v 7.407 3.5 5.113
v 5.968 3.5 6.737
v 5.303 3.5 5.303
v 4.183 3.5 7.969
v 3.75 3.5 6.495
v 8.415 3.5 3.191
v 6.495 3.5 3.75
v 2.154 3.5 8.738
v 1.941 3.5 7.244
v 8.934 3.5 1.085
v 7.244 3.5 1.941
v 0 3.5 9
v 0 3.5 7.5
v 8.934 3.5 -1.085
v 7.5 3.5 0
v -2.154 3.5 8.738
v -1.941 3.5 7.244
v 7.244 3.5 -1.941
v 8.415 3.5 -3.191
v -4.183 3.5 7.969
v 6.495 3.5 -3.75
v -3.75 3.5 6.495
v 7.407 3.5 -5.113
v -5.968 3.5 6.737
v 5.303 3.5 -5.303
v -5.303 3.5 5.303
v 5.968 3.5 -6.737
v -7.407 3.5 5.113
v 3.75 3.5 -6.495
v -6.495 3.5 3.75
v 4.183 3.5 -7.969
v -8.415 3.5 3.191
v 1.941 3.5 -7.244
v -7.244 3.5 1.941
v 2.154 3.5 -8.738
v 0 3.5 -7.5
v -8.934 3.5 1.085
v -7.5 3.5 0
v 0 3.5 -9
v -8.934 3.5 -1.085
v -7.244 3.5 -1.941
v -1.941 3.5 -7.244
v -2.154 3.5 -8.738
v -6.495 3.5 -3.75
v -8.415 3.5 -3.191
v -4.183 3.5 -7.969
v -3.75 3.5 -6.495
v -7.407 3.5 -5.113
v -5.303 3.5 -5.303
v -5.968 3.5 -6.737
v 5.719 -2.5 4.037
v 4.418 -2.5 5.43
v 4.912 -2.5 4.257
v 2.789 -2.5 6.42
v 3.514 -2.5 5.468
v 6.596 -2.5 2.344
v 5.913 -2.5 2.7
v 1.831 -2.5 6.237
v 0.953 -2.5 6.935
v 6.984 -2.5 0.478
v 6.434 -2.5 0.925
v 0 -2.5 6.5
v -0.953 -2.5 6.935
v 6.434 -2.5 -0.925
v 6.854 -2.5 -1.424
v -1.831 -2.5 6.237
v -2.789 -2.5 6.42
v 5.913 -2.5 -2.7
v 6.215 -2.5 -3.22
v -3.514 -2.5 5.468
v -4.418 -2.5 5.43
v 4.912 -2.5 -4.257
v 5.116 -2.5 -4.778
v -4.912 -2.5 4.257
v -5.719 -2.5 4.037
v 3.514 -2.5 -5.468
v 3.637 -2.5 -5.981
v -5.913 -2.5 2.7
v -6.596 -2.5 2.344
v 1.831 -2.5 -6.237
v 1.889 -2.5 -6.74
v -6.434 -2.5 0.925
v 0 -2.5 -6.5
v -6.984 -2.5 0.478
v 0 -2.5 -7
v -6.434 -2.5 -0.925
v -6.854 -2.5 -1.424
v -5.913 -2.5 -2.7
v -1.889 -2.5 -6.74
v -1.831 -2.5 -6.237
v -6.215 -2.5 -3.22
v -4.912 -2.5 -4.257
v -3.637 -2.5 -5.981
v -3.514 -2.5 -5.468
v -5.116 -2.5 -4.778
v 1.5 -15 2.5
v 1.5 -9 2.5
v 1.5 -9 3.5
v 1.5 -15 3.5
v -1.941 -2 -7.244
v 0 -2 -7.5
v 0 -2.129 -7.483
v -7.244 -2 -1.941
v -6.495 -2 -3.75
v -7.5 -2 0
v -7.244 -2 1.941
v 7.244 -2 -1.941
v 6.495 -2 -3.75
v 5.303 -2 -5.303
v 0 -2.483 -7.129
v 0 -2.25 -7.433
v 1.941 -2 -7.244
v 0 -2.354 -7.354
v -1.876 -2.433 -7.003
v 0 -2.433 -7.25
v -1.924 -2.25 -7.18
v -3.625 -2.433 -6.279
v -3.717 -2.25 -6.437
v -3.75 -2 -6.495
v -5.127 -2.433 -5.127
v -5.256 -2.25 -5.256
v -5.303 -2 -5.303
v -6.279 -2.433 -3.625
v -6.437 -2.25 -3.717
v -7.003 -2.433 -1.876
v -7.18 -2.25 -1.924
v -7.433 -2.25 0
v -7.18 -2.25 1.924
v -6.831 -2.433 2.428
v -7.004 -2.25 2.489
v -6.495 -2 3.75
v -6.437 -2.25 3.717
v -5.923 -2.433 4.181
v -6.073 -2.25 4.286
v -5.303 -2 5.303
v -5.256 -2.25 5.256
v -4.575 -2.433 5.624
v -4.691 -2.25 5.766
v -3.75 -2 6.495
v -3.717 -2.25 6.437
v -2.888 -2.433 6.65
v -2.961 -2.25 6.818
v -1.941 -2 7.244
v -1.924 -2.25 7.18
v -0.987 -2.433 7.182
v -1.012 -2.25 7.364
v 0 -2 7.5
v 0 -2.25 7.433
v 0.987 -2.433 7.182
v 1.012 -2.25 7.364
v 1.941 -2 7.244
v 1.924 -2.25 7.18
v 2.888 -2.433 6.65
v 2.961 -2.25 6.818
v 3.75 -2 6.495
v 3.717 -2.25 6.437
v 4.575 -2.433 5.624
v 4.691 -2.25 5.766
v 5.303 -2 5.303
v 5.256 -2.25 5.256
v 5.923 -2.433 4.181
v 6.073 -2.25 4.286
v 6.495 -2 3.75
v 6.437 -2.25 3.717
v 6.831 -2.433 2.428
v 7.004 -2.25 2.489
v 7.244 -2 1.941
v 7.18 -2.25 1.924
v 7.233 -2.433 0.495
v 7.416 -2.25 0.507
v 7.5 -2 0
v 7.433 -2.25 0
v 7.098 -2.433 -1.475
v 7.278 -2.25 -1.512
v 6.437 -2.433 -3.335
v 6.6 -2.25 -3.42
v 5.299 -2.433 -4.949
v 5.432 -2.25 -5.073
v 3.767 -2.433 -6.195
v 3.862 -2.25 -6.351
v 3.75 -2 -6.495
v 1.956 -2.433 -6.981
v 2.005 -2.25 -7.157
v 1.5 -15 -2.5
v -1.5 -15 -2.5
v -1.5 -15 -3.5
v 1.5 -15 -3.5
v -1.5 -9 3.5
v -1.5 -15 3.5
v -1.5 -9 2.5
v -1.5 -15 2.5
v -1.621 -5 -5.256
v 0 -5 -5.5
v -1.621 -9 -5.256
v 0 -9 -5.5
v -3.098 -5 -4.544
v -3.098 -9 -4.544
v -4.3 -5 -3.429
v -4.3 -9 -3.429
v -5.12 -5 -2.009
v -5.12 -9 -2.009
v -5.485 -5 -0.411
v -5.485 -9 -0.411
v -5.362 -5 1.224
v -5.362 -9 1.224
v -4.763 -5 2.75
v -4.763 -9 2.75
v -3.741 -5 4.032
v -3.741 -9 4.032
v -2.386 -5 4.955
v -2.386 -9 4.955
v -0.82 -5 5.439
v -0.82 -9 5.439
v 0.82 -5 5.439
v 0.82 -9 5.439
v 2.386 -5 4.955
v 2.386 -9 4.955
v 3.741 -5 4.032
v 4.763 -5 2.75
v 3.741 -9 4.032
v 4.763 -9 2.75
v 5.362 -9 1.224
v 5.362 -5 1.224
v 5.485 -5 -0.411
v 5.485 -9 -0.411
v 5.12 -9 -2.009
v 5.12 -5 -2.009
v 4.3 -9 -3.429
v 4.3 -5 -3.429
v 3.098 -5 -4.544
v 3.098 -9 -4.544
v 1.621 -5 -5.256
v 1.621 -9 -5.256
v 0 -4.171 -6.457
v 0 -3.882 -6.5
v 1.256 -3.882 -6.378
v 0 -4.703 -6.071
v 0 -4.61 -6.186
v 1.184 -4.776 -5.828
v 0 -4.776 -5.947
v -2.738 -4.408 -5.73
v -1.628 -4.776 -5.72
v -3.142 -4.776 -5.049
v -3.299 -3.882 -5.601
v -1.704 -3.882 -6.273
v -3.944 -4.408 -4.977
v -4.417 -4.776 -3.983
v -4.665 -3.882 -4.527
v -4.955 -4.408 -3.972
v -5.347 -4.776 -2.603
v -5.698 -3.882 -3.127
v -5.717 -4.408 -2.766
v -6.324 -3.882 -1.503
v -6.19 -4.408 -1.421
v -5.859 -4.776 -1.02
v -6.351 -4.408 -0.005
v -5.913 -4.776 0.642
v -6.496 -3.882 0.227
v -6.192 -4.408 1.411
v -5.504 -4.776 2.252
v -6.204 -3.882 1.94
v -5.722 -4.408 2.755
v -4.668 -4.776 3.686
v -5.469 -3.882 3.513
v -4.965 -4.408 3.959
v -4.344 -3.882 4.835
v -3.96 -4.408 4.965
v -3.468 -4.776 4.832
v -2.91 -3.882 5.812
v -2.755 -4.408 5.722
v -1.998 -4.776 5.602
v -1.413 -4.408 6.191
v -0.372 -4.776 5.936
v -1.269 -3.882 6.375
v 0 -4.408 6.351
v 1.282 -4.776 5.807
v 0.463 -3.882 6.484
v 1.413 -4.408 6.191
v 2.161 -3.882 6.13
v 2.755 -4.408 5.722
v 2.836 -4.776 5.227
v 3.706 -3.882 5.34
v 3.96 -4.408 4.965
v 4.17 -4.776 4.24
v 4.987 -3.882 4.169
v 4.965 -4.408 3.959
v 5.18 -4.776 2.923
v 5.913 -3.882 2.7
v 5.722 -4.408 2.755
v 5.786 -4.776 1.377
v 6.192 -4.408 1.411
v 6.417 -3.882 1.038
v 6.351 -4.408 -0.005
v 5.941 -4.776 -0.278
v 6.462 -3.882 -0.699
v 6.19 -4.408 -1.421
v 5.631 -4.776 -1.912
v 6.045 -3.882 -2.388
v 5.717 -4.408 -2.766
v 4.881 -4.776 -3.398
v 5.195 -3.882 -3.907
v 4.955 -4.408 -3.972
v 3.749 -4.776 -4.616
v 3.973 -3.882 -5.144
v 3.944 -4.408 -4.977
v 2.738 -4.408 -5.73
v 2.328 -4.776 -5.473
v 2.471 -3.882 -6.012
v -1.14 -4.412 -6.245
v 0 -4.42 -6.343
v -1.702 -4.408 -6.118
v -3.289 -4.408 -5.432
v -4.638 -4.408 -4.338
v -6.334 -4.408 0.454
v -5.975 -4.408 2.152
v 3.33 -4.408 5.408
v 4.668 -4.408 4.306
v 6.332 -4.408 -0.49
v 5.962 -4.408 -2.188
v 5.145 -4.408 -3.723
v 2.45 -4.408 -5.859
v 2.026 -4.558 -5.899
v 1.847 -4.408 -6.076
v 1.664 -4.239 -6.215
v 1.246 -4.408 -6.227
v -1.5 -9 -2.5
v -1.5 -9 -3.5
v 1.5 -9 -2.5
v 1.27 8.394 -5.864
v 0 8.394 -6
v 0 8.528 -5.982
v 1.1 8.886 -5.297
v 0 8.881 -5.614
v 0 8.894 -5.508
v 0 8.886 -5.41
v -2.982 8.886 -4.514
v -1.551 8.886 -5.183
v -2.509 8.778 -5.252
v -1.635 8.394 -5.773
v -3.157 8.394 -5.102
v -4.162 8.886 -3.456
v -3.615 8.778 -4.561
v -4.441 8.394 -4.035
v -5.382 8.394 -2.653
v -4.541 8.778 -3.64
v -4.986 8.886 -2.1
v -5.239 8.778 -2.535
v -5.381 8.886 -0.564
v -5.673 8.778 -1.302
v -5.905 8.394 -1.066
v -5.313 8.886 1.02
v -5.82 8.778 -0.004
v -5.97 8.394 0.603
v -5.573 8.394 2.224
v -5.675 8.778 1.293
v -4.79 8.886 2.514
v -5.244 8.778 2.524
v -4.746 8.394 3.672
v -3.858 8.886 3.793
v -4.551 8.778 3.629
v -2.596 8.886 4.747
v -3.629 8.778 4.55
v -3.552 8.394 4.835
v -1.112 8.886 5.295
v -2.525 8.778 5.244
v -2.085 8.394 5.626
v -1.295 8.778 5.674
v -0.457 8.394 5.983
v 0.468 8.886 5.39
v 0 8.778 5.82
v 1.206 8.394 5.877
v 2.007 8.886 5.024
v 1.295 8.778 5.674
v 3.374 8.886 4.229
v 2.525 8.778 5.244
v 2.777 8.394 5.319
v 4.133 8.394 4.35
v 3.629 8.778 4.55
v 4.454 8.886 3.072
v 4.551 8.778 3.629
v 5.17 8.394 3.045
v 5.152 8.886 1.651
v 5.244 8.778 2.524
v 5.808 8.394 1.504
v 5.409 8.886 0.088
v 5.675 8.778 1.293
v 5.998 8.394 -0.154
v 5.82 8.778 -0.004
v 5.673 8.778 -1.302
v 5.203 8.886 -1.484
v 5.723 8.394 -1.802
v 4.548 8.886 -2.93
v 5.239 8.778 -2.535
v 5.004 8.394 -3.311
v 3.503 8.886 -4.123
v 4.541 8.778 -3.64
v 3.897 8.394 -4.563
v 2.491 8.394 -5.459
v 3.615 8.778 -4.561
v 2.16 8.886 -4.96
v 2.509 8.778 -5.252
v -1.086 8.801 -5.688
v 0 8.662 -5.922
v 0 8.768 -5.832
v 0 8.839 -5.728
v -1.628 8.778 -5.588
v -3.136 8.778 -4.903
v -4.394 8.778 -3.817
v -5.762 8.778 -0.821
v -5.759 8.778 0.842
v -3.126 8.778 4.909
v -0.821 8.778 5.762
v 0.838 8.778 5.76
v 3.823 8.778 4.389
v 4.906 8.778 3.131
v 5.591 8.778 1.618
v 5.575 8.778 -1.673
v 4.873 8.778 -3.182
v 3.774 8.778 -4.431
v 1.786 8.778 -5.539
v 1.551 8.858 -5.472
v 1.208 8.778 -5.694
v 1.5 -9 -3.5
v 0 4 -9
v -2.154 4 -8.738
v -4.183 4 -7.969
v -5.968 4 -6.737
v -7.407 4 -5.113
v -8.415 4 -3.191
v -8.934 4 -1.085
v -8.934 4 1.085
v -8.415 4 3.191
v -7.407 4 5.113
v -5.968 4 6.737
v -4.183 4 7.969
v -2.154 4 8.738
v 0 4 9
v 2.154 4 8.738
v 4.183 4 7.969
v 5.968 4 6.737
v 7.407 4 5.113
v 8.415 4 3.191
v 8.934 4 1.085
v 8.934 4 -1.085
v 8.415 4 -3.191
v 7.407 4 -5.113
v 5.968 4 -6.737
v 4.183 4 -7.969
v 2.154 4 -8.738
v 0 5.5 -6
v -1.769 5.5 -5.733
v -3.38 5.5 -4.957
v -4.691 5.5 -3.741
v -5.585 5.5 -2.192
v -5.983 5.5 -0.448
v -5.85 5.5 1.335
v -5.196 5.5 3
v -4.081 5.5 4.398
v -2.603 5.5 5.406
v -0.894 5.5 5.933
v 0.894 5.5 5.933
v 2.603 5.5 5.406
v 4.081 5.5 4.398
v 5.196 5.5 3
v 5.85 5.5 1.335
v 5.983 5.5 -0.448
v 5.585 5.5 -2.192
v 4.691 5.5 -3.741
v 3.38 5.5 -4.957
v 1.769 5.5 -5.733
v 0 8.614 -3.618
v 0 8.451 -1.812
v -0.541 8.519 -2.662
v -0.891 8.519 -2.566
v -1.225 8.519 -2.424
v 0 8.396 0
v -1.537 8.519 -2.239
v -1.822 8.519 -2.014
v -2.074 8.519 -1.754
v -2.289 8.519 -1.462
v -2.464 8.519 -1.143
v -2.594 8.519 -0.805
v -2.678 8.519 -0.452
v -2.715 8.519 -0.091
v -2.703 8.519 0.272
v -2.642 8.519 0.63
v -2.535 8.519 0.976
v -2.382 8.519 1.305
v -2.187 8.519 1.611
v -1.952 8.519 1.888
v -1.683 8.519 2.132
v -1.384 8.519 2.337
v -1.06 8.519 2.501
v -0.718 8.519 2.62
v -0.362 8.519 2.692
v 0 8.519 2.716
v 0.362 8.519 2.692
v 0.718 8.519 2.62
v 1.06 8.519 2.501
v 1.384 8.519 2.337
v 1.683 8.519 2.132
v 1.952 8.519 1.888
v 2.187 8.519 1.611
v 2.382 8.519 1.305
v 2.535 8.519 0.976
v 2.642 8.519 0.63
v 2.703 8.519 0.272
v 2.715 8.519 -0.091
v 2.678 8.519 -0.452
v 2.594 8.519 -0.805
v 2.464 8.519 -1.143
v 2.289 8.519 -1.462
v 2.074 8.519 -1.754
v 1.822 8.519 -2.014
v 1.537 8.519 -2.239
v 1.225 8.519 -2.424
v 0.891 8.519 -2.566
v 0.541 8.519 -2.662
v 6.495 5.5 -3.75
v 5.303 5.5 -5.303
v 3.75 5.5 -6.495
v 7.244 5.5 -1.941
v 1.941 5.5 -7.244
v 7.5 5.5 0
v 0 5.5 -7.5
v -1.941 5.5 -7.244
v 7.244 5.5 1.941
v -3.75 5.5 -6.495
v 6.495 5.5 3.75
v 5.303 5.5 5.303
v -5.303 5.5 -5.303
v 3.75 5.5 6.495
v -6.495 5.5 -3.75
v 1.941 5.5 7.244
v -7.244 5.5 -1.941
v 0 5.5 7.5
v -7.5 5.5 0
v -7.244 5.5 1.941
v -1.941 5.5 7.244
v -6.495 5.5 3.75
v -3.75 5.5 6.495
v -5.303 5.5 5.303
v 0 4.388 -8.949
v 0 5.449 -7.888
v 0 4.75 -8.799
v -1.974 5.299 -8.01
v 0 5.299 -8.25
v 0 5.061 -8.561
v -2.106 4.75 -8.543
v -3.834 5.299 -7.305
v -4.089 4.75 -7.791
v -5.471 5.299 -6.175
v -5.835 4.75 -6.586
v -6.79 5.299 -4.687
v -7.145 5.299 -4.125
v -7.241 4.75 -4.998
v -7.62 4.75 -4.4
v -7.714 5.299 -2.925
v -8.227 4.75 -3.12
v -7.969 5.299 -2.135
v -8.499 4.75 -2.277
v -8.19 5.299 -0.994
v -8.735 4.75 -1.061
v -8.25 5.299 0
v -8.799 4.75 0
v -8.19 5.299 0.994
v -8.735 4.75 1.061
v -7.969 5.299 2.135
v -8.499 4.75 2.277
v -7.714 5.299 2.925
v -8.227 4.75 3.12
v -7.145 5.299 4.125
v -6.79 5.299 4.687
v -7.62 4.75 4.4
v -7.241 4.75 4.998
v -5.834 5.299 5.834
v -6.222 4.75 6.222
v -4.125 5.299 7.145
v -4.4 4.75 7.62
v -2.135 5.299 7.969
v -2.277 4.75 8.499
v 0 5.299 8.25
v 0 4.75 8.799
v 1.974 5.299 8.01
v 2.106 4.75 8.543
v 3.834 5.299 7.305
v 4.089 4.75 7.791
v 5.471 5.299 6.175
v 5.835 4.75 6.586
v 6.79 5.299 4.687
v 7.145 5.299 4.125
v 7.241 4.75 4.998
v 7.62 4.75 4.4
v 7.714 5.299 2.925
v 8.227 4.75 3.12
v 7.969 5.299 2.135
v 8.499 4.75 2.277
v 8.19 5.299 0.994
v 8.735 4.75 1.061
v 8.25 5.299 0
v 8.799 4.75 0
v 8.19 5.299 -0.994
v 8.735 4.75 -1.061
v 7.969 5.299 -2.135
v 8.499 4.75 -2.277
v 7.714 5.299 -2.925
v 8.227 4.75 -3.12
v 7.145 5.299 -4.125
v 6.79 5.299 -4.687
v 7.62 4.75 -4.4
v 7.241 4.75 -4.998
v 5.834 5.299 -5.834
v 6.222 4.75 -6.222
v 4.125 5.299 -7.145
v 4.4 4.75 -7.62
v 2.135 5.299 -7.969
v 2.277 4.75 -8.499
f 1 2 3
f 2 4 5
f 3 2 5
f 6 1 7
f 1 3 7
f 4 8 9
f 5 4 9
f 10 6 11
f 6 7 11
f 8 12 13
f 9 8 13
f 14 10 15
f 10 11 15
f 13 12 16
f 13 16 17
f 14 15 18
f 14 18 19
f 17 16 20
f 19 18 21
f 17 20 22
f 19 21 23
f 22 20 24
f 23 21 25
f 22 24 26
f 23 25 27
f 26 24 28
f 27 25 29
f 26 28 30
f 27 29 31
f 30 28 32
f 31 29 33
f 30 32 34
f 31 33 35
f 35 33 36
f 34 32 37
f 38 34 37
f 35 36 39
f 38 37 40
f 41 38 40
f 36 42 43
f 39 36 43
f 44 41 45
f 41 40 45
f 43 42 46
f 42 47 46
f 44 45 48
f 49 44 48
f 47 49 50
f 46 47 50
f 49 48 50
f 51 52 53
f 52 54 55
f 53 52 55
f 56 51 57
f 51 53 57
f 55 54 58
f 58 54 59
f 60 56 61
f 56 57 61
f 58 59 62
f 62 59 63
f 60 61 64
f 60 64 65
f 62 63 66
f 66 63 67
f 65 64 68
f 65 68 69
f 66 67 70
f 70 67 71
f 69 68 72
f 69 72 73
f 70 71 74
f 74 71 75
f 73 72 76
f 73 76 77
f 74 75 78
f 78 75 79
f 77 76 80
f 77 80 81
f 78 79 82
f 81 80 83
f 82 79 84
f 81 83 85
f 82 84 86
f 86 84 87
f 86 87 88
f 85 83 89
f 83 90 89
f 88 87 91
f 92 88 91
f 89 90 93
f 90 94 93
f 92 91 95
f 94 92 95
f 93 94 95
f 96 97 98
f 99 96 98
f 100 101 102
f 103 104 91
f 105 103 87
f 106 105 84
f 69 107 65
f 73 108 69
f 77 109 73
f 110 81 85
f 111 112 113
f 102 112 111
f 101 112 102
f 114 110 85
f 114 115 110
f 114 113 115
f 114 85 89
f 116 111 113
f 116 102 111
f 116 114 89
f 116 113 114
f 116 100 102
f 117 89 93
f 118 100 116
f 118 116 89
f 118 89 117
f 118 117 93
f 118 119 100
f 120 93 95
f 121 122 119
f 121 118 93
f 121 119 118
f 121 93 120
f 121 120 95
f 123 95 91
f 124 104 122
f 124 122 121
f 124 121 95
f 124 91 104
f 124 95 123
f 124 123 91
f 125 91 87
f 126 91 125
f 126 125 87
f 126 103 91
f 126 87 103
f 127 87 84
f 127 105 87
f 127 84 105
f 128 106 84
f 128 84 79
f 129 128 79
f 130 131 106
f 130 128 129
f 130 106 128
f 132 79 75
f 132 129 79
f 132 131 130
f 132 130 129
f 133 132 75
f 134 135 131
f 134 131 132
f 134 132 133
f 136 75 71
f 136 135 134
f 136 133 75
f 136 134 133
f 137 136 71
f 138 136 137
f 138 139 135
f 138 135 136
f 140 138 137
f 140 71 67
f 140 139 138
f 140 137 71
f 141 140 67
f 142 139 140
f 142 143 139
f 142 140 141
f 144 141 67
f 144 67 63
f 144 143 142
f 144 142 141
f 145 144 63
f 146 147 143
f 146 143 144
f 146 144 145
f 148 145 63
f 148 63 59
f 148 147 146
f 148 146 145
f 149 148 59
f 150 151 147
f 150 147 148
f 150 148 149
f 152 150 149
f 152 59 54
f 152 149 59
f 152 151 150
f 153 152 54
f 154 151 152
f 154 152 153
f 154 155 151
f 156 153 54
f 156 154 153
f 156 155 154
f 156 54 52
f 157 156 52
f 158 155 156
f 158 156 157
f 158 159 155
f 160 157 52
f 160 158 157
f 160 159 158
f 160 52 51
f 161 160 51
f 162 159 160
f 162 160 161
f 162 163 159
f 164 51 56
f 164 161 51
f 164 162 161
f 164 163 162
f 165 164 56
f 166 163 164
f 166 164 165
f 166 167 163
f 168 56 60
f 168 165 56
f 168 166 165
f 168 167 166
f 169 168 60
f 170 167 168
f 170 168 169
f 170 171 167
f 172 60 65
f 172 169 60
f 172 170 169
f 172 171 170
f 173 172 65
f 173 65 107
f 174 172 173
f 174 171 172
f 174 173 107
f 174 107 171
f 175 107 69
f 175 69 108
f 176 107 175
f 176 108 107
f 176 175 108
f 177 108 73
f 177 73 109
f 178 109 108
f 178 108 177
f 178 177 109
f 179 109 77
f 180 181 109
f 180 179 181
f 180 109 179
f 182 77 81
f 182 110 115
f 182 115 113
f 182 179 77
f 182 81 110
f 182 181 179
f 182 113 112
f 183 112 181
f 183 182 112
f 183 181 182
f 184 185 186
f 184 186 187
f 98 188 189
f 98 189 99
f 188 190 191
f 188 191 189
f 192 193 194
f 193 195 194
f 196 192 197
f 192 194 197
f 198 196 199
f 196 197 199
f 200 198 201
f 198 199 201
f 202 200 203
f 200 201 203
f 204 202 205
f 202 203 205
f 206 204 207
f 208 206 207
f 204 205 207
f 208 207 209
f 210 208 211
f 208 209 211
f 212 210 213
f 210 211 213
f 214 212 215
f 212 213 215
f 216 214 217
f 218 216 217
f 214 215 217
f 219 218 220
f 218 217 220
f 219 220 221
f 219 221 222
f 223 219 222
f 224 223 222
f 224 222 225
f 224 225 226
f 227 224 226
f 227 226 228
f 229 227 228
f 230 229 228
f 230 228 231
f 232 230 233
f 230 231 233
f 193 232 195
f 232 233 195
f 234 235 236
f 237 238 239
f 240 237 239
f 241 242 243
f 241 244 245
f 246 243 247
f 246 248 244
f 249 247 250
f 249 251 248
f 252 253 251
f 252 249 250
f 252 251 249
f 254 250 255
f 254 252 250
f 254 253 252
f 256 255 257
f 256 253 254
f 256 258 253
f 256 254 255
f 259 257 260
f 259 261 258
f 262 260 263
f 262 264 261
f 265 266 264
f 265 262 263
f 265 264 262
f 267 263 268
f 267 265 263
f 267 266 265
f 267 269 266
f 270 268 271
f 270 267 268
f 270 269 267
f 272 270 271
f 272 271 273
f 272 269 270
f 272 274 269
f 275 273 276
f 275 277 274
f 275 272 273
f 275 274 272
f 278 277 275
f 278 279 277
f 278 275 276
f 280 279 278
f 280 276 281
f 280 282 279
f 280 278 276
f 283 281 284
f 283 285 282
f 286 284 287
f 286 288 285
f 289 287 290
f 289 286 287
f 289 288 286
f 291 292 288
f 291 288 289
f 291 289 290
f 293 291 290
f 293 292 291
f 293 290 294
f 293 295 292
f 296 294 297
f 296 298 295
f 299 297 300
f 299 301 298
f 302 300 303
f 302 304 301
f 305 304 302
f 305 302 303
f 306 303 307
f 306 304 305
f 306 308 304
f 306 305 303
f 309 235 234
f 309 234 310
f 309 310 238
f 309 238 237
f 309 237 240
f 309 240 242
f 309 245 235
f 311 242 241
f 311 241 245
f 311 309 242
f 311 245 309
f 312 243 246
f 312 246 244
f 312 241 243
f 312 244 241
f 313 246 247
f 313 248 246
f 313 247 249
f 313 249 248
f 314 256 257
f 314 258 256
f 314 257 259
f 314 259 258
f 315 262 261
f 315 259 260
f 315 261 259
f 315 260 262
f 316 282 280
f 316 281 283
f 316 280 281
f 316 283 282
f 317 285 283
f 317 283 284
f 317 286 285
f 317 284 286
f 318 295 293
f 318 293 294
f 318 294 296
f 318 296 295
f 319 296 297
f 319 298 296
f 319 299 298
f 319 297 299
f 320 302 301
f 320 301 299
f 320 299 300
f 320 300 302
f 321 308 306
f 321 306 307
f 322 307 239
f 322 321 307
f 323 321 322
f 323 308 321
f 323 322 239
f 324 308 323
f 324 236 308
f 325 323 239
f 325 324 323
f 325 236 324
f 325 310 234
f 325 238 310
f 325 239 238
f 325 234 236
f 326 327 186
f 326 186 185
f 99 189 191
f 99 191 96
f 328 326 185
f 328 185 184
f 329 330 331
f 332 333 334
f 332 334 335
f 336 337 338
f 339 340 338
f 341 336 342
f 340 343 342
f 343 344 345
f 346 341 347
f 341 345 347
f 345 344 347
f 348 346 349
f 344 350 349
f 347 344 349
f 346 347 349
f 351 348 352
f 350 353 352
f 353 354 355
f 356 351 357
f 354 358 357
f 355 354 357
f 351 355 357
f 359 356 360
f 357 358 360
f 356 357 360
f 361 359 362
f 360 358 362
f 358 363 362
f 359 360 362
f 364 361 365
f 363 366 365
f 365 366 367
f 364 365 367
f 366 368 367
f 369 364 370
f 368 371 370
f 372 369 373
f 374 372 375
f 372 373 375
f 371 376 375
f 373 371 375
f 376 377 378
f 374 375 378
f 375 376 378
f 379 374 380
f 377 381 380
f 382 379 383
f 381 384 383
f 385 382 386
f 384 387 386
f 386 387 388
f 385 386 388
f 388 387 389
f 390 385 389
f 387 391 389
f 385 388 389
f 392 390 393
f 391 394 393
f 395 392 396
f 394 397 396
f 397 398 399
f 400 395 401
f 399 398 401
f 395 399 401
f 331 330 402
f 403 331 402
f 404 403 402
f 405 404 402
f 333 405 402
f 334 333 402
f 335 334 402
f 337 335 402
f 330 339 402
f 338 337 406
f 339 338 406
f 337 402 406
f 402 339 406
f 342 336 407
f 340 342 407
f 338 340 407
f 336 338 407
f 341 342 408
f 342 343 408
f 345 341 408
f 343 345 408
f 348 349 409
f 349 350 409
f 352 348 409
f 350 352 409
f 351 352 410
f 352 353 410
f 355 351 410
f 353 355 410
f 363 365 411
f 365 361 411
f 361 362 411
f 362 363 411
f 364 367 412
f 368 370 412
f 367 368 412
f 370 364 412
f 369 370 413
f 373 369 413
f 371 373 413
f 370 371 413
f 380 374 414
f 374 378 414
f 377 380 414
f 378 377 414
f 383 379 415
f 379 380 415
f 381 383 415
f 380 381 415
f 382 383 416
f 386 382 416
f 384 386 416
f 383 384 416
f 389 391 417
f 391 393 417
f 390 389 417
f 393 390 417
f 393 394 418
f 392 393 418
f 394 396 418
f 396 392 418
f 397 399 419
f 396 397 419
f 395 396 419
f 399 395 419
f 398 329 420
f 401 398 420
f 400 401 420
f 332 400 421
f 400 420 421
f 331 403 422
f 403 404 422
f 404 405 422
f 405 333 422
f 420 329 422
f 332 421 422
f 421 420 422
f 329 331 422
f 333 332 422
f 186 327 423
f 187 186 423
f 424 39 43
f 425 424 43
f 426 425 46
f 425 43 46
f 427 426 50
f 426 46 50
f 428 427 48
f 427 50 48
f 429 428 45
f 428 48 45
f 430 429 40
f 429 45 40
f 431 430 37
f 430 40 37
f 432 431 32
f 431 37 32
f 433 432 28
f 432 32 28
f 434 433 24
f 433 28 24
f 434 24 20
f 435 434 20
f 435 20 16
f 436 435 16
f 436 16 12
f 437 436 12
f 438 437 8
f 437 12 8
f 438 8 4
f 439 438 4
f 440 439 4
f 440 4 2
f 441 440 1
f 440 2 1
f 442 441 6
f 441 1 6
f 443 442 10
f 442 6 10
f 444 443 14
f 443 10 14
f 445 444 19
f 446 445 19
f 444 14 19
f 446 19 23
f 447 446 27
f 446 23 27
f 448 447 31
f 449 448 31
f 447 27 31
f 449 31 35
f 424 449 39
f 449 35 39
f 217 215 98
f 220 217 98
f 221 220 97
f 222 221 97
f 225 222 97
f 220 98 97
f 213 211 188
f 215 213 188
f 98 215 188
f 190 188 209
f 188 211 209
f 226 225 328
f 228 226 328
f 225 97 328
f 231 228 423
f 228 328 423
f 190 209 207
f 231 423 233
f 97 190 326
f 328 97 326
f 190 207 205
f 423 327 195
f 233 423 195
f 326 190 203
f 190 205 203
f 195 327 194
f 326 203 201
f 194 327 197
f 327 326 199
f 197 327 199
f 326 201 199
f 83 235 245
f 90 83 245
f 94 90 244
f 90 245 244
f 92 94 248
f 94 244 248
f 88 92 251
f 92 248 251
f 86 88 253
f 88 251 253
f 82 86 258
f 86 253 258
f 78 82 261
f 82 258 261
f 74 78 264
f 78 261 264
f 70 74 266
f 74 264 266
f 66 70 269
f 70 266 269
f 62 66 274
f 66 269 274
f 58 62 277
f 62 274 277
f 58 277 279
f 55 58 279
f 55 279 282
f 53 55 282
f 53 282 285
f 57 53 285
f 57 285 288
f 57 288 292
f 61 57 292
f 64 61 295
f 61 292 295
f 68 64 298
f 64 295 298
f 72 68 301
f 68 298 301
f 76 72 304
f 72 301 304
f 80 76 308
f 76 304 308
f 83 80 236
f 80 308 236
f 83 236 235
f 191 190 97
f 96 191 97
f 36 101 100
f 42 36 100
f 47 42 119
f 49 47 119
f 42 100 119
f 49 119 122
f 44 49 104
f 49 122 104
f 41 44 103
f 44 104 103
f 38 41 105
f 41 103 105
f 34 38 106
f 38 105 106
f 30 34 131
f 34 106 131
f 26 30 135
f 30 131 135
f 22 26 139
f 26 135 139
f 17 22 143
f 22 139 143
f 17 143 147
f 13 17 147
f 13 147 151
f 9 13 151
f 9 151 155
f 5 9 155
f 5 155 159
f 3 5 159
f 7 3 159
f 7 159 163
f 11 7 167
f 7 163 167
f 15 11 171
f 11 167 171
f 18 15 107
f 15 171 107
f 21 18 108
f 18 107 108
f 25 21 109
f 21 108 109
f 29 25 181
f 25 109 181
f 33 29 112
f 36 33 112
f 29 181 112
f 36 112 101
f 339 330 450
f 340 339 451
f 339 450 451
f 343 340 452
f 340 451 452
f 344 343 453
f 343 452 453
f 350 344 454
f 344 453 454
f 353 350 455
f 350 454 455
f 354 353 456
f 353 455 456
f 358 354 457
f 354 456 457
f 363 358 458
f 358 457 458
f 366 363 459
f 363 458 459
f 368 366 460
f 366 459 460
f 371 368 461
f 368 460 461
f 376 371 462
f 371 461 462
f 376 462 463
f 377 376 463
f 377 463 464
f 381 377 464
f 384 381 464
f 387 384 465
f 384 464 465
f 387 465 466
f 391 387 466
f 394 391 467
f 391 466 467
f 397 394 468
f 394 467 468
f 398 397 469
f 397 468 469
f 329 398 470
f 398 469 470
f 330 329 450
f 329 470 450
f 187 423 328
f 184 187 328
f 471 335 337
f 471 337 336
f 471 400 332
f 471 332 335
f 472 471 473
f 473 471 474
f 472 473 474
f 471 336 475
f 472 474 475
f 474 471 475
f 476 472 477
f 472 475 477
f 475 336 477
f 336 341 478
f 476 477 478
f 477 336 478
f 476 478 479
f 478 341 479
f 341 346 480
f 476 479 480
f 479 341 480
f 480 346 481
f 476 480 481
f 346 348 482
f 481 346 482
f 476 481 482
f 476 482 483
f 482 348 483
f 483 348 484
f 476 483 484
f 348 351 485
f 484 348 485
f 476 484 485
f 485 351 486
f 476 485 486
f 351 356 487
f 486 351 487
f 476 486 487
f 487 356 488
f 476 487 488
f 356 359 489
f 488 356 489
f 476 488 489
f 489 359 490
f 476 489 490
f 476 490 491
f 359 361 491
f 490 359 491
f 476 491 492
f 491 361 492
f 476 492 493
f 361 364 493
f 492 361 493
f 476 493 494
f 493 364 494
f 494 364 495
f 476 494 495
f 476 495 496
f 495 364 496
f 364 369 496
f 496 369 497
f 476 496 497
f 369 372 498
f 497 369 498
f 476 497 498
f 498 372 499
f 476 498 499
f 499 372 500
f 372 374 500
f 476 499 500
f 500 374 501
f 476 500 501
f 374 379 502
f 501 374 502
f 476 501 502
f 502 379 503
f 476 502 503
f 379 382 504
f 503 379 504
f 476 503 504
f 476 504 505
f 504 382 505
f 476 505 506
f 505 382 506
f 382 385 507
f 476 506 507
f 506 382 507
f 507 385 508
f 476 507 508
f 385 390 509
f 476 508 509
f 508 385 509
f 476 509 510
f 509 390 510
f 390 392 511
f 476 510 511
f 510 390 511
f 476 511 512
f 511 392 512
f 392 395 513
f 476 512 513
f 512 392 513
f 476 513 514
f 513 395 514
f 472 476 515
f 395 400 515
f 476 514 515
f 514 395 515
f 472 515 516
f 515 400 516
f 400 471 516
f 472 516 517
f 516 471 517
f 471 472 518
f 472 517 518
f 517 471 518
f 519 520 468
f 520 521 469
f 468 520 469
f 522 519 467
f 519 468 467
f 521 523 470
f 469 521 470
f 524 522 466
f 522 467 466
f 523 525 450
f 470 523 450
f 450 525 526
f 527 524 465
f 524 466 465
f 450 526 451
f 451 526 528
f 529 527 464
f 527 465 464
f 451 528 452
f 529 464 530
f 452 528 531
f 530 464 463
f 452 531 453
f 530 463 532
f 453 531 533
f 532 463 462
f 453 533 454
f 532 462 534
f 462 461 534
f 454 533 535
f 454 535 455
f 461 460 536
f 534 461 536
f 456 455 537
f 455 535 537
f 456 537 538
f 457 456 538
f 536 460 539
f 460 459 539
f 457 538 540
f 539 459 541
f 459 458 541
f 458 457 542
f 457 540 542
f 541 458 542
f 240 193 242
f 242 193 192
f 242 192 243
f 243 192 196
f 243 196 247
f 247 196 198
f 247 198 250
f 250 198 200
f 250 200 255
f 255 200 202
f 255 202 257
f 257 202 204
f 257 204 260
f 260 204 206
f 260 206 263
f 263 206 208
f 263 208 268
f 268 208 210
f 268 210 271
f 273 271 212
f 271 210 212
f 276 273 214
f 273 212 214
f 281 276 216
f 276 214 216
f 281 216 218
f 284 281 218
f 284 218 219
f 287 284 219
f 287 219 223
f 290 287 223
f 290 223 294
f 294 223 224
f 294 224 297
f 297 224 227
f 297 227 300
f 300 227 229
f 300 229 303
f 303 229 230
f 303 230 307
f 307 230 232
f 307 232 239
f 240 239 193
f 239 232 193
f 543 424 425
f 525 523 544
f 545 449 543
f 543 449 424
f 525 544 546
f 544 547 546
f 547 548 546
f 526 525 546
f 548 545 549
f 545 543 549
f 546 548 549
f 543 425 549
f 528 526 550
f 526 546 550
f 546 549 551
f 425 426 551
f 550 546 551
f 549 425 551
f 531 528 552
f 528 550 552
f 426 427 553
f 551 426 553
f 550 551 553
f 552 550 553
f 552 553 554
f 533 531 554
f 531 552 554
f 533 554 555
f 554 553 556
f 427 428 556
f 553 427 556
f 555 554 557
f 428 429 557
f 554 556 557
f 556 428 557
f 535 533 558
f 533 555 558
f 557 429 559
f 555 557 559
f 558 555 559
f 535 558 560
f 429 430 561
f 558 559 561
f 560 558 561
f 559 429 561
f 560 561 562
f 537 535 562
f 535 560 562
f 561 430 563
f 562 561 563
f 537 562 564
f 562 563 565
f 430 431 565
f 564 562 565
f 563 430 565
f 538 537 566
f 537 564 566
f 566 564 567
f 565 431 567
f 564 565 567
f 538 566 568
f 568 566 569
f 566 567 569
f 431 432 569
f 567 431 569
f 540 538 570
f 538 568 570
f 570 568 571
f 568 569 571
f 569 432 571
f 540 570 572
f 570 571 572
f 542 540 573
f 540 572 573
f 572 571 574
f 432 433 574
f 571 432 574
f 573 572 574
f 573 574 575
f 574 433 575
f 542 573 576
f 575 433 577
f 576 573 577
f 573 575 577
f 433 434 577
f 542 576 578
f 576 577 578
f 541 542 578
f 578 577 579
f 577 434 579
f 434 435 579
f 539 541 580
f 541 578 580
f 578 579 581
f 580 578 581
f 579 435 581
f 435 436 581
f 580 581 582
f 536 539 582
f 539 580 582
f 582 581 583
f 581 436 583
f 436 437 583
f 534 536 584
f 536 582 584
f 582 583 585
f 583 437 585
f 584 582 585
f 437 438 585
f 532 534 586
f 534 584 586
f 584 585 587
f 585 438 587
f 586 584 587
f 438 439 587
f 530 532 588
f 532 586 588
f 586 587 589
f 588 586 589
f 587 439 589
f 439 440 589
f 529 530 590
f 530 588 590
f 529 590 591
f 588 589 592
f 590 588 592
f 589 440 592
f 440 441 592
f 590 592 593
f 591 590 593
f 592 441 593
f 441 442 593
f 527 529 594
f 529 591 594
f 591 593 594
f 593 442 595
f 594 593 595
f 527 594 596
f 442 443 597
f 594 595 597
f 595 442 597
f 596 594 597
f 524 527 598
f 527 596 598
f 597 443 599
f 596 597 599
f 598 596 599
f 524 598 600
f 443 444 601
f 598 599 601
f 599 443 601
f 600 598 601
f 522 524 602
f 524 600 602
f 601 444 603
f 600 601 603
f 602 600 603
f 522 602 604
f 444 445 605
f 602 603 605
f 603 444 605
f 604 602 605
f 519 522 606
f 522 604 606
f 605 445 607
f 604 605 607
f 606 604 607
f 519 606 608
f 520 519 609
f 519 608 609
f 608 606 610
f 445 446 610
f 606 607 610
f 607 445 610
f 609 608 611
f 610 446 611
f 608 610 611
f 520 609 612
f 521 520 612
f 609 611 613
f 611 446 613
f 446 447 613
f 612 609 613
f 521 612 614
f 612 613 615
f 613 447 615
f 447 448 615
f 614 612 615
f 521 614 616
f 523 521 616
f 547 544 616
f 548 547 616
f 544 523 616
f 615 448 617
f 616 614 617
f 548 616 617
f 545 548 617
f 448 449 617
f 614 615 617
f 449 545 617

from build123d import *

# Parameters (mm, degrees)
FILLET1_R           = 1.5
FILLET2_R           = 0.5
FILLET3_R           = 1
FILLET4_R           = 0.5
SKETCH2_W           = 3
SKETCH2_H           = 1
BOSS_EXTRUDE1_DEPTH = 6


with BuildPart() as part:
    # Sketch1 → Revolve1 (revolve)
    with BuildSketch(Plane.XY, mode=Mode.PRIVATE) as revolve1_sk:
        with BuildLine():
            Line((6, 9), (6, 5.5))
            Line((6, 5.5), (9, 5.5))
            Line((9, 5.5), (9, 3.5))
            Line((9, 3.5), (7.5, 3.5))
            Line((7.5, 3.5), (7.5, -2.5))
            Line((7.5, -2.5), (6.5, -2.5))
            Line((6.5, -2.5), (6.5, -4.5))
            Line((6.5, -4.5), (5.5, -5))
            Line((5.5, -5), (5.5, -9))
            Line((5.5, -9), (0, -9))
            Line((0, -9), (0, 8.396096516))
            ThreePointArc((0, 8.396096516), (3.015157517, 8.547452829), (6, 9))
        make_face()
    revolve(revolve1_sk.sketch.rotate(Axis((0, -9, 0), (0, 1, 0)), 90), axis=Axis((0, -9, 0), (0, 1, 0)))

    # Fillet1
    fillet1_edges = [part.edges().sort_by_distance(p)[0] for p in [
        (0, 5.5, 9),
    ]]
    fillet(fillet1_edges, radius=FILLET1_R)

    # Fillet2
    fillet2_edges = [part.edges().sort_by_distance(p)[0] for p in [
        (0, 9, 6),
    ]]
    fillet(fillet2_edges, radius=FILLET2_R)

    # Fillet3
    fillet3_edges = [part.edges().sort_by_distance(p)[0] for p in [
        (0, -4.5, 6.5),
    ]]
    fillet(fillet3_edges, radius=FILLET3_R)

    # Fillet4
    fillet4_edges = [part.edges().sort_by_distance(p)[0] for p in [
        (0, -2.5, 7.5),
    ]]
    fillet(fillet4_edges, radius=FILLET4_R)

    # Sketch2 → Boss-Extrude1 (add)
    with BuildSketch(Plane.XZ.offset(9)):
        with Locations((0, 3)):
            Rectangle(SKETCH2_W, SKETCH2_H)
        with Locations((0, -3)):
            Rectangle(SKETCH2_W, SKETCH2_H)
    extrude(amount=BOSS_EXTRUDE1_DEPTH)


solid = part.part
